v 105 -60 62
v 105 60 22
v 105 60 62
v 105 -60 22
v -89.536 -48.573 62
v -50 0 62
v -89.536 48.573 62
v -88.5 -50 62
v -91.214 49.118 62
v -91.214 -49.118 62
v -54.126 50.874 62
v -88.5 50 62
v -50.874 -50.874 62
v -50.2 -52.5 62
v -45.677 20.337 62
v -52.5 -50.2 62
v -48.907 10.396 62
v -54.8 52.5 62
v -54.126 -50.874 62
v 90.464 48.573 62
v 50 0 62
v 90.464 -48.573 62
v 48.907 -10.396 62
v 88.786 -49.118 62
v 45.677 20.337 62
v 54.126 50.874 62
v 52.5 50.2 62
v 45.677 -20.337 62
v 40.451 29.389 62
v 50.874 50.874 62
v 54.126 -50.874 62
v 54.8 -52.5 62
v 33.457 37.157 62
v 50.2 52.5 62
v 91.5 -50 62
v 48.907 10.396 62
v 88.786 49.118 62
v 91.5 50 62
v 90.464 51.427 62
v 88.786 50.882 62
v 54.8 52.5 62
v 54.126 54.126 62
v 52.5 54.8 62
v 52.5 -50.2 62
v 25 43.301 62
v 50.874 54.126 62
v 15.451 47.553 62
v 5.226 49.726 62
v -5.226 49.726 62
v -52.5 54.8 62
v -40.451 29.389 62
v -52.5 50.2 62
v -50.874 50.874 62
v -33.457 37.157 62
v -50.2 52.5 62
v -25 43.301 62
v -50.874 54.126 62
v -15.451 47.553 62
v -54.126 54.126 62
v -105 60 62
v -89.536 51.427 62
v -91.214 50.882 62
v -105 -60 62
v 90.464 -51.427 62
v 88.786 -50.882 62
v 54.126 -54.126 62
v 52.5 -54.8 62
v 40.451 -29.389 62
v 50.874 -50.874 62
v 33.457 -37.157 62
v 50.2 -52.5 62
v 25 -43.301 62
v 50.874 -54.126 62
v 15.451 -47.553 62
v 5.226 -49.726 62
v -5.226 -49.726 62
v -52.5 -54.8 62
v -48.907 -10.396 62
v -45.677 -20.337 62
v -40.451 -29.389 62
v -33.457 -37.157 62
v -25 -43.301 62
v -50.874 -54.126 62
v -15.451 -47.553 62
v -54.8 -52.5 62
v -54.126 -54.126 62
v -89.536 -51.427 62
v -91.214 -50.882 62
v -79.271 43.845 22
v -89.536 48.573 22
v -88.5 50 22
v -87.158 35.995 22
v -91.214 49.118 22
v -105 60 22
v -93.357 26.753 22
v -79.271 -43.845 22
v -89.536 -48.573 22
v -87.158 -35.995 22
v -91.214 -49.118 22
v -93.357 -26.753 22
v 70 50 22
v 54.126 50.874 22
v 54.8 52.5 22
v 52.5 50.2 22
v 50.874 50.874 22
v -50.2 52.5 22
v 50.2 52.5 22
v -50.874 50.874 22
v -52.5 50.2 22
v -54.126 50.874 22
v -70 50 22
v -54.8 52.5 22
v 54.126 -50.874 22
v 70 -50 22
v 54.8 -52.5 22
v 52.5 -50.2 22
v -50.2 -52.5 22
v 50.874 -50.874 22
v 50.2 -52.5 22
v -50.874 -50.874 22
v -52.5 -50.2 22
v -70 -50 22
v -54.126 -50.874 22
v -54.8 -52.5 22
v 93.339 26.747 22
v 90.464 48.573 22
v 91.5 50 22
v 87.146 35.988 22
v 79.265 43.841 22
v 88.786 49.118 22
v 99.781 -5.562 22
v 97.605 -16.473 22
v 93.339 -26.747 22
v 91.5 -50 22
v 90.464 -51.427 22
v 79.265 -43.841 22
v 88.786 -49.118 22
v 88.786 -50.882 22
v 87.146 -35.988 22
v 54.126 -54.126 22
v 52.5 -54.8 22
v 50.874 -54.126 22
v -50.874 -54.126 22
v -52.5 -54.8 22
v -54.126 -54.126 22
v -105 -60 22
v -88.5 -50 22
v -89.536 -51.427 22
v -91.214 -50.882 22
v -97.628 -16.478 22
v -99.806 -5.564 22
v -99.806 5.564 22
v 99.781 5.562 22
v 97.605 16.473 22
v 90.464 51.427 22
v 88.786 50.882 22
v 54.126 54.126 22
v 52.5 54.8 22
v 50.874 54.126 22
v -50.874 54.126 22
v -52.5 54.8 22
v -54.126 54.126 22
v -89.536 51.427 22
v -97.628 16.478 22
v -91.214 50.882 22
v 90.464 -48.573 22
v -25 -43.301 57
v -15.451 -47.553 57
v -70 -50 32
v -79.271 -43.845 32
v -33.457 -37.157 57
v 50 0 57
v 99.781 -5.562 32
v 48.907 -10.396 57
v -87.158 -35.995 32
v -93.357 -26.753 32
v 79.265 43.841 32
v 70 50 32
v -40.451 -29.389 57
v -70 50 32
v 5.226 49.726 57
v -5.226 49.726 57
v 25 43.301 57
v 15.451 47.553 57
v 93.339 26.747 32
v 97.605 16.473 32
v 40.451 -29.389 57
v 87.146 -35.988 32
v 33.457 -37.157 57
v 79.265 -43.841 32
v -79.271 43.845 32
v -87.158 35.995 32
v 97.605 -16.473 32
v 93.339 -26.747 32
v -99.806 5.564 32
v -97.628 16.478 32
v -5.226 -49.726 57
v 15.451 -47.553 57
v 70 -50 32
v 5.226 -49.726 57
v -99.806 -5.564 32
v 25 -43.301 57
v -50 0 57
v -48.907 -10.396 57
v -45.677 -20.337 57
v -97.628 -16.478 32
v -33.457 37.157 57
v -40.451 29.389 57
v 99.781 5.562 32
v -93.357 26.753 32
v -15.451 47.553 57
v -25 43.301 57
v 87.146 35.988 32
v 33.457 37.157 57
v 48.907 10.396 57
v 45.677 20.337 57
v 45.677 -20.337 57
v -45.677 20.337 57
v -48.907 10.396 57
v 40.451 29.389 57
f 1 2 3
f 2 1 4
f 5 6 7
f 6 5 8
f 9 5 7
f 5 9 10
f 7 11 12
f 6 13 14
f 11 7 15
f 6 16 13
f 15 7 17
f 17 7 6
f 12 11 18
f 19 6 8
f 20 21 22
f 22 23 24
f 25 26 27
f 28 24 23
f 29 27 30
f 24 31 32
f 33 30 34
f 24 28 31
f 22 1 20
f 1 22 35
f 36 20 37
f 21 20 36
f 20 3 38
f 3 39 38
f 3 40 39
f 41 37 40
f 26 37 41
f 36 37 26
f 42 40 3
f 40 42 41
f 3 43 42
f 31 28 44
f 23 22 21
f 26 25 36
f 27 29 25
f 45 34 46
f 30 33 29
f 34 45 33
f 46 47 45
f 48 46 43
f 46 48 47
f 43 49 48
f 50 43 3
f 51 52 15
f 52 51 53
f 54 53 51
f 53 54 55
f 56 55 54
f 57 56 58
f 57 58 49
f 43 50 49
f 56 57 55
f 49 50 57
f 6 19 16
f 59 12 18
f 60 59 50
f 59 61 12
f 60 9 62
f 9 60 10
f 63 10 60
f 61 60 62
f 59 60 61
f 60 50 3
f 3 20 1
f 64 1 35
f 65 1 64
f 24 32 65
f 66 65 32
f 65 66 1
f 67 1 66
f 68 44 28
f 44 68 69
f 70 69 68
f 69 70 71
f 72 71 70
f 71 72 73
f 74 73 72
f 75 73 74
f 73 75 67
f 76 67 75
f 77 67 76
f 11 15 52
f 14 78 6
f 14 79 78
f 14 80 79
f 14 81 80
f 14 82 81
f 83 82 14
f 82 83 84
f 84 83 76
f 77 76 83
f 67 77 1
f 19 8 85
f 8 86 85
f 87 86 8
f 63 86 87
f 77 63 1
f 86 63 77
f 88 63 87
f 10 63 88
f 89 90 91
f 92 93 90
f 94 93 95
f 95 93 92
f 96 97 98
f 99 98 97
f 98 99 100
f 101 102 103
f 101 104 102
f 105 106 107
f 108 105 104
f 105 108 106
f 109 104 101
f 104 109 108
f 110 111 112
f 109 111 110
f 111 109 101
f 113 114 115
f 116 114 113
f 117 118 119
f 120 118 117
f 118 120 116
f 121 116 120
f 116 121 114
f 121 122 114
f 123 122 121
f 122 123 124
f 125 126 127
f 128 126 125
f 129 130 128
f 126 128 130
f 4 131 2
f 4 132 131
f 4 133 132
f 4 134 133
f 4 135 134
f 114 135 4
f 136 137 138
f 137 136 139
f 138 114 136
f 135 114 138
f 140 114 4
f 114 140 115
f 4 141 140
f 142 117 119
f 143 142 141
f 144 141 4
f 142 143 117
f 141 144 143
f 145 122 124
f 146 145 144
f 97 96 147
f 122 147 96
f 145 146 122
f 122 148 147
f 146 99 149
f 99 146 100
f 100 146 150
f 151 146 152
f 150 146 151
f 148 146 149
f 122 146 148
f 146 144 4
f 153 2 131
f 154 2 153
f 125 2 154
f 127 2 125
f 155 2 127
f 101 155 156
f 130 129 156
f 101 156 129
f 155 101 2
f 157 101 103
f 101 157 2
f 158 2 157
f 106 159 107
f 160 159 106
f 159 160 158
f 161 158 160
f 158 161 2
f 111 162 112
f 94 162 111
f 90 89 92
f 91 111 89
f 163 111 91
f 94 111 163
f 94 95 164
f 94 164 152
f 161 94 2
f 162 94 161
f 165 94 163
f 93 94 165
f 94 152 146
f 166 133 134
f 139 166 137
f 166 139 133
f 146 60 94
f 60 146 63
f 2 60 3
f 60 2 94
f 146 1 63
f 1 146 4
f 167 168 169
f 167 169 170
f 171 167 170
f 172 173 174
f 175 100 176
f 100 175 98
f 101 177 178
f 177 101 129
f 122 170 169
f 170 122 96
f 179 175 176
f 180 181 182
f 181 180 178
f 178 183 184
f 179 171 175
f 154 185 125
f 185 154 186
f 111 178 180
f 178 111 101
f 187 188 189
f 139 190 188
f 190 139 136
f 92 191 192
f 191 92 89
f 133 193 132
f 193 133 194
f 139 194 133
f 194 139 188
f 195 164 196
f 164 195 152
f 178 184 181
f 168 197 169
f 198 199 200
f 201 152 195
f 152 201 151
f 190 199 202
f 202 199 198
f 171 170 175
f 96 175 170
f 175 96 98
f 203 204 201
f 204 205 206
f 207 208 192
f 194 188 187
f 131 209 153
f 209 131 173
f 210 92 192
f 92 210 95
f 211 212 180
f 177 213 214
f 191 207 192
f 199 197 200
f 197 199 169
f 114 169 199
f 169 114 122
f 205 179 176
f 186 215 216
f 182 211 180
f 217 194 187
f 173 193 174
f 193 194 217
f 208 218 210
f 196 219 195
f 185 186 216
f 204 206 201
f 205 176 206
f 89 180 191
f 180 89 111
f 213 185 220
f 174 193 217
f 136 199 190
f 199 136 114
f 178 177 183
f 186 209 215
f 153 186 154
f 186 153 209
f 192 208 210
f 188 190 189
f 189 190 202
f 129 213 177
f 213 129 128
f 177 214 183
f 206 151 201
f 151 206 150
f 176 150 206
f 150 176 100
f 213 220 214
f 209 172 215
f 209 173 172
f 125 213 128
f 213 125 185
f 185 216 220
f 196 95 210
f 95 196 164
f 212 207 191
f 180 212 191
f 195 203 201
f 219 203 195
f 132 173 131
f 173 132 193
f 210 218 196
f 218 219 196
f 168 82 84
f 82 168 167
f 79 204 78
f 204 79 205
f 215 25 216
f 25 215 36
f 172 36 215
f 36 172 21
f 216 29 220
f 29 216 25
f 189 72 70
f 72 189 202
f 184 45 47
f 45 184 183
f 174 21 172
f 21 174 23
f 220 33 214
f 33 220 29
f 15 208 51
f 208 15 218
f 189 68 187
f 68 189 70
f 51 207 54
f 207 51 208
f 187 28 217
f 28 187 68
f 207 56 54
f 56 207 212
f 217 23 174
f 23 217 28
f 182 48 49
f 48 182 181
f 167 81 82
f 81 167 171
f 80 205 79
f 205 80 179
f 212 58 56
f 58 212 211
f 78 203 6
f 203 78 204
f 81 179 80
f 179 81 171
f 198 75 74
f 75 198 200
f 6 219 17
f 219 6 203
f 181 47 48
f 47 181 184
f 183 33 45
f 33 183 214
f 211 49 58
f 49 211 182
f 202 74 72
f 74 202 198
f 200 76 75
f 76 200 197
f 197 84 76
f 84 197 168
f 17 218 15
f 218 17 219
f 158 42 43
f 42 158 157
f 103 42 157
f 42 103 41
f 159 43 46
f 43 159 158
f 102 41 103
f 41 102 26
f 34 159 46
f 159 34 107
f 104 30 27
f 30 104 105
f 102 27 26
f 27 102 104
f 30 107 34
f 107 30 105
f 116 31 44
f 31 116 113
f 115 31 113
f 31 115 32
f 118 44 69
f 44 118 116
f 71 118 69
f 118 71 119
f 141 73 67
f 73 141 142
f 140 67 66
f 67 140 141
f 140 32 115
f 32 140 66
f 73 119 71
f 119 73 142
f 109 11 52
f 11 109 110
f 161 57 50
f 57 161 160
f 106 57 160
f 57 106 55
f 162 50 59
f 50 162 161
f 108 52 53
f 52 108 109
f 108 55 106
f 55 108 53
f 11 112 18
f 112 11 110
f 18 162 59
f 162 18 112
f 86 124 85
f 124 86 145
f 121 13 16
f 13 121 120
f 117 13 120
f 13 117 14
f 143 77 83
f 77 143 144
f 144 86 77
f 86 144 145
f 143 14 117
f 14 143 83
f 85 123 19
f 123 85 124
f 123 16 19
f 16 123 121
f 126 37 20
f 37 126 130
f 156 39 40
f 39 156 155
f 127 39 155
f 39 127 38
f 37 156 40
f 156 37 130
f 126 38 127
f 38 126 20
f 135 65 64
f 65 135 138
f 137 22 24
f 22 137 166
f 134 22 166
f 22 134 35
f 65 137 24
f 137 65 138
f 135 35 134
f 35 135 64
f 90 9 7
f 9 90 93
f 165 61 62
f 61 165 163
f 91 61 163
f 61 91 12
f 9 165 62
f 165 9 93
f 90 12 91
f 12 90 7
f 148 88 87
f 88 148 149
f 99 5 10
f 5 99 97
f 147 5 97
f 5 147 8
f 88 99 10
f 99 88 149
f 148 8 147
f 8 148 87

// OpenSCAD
module bottom() {
	difference() {
		cube([210,120,40], center=true);
		
		// Hole for headset bit
		translate([0,0,-5])
			cube([200,120,35], center=true);
		
		// Airflow Hole
		translate([-100,-50,7.5])
			linear_extrude("vive.dxf", height=20);
		
		// Combo Holes
		translate([90,50])
			cylinder(d=3,h=100);
		translate([90,-50])
			cylinder(d=3,h=100);
		translate([-90,50])
			cylinder(d=3,h=100);
		translate([-90,-50])
			cylinder(d=3,h=100);
	}
}

module top() {
	difference() {
		translate([0,0,20])
			cube([210,120,40], center=true);
		hull() {
			translate([-100,-50,0])
				linear_extrude("vive.dxf", height=10);
			cylinder(d=100, h=35);
		};
		cylinder(d=100, h=40);
		
		// Fan mount holes
		translate([105/2,105/2,-25])
			cylinder(d=4.6, h=100);
		translate([105/2,-105/2,-25])
			cylinder(d=4.6, h=100);
		translate([-105/2,105/2,-25])
			cylinder(d=4.6, h=100);
		translate([-105/2,-105/2,-25])
			cylinder(d=4.6, h=100);
		
		// Combo Holes
		translate([90,50])
			cylinder(d=3,h=100);
		translate([90,-50])
			cylinder(d=3,h=100);
		translate([-90,50])
			cylinder(d=3,h=100);
		translate([-90,-50])
			cylinder(d=3,h=100);
	}
}

translate([0,0,20+2])
	top();
*bottom();
